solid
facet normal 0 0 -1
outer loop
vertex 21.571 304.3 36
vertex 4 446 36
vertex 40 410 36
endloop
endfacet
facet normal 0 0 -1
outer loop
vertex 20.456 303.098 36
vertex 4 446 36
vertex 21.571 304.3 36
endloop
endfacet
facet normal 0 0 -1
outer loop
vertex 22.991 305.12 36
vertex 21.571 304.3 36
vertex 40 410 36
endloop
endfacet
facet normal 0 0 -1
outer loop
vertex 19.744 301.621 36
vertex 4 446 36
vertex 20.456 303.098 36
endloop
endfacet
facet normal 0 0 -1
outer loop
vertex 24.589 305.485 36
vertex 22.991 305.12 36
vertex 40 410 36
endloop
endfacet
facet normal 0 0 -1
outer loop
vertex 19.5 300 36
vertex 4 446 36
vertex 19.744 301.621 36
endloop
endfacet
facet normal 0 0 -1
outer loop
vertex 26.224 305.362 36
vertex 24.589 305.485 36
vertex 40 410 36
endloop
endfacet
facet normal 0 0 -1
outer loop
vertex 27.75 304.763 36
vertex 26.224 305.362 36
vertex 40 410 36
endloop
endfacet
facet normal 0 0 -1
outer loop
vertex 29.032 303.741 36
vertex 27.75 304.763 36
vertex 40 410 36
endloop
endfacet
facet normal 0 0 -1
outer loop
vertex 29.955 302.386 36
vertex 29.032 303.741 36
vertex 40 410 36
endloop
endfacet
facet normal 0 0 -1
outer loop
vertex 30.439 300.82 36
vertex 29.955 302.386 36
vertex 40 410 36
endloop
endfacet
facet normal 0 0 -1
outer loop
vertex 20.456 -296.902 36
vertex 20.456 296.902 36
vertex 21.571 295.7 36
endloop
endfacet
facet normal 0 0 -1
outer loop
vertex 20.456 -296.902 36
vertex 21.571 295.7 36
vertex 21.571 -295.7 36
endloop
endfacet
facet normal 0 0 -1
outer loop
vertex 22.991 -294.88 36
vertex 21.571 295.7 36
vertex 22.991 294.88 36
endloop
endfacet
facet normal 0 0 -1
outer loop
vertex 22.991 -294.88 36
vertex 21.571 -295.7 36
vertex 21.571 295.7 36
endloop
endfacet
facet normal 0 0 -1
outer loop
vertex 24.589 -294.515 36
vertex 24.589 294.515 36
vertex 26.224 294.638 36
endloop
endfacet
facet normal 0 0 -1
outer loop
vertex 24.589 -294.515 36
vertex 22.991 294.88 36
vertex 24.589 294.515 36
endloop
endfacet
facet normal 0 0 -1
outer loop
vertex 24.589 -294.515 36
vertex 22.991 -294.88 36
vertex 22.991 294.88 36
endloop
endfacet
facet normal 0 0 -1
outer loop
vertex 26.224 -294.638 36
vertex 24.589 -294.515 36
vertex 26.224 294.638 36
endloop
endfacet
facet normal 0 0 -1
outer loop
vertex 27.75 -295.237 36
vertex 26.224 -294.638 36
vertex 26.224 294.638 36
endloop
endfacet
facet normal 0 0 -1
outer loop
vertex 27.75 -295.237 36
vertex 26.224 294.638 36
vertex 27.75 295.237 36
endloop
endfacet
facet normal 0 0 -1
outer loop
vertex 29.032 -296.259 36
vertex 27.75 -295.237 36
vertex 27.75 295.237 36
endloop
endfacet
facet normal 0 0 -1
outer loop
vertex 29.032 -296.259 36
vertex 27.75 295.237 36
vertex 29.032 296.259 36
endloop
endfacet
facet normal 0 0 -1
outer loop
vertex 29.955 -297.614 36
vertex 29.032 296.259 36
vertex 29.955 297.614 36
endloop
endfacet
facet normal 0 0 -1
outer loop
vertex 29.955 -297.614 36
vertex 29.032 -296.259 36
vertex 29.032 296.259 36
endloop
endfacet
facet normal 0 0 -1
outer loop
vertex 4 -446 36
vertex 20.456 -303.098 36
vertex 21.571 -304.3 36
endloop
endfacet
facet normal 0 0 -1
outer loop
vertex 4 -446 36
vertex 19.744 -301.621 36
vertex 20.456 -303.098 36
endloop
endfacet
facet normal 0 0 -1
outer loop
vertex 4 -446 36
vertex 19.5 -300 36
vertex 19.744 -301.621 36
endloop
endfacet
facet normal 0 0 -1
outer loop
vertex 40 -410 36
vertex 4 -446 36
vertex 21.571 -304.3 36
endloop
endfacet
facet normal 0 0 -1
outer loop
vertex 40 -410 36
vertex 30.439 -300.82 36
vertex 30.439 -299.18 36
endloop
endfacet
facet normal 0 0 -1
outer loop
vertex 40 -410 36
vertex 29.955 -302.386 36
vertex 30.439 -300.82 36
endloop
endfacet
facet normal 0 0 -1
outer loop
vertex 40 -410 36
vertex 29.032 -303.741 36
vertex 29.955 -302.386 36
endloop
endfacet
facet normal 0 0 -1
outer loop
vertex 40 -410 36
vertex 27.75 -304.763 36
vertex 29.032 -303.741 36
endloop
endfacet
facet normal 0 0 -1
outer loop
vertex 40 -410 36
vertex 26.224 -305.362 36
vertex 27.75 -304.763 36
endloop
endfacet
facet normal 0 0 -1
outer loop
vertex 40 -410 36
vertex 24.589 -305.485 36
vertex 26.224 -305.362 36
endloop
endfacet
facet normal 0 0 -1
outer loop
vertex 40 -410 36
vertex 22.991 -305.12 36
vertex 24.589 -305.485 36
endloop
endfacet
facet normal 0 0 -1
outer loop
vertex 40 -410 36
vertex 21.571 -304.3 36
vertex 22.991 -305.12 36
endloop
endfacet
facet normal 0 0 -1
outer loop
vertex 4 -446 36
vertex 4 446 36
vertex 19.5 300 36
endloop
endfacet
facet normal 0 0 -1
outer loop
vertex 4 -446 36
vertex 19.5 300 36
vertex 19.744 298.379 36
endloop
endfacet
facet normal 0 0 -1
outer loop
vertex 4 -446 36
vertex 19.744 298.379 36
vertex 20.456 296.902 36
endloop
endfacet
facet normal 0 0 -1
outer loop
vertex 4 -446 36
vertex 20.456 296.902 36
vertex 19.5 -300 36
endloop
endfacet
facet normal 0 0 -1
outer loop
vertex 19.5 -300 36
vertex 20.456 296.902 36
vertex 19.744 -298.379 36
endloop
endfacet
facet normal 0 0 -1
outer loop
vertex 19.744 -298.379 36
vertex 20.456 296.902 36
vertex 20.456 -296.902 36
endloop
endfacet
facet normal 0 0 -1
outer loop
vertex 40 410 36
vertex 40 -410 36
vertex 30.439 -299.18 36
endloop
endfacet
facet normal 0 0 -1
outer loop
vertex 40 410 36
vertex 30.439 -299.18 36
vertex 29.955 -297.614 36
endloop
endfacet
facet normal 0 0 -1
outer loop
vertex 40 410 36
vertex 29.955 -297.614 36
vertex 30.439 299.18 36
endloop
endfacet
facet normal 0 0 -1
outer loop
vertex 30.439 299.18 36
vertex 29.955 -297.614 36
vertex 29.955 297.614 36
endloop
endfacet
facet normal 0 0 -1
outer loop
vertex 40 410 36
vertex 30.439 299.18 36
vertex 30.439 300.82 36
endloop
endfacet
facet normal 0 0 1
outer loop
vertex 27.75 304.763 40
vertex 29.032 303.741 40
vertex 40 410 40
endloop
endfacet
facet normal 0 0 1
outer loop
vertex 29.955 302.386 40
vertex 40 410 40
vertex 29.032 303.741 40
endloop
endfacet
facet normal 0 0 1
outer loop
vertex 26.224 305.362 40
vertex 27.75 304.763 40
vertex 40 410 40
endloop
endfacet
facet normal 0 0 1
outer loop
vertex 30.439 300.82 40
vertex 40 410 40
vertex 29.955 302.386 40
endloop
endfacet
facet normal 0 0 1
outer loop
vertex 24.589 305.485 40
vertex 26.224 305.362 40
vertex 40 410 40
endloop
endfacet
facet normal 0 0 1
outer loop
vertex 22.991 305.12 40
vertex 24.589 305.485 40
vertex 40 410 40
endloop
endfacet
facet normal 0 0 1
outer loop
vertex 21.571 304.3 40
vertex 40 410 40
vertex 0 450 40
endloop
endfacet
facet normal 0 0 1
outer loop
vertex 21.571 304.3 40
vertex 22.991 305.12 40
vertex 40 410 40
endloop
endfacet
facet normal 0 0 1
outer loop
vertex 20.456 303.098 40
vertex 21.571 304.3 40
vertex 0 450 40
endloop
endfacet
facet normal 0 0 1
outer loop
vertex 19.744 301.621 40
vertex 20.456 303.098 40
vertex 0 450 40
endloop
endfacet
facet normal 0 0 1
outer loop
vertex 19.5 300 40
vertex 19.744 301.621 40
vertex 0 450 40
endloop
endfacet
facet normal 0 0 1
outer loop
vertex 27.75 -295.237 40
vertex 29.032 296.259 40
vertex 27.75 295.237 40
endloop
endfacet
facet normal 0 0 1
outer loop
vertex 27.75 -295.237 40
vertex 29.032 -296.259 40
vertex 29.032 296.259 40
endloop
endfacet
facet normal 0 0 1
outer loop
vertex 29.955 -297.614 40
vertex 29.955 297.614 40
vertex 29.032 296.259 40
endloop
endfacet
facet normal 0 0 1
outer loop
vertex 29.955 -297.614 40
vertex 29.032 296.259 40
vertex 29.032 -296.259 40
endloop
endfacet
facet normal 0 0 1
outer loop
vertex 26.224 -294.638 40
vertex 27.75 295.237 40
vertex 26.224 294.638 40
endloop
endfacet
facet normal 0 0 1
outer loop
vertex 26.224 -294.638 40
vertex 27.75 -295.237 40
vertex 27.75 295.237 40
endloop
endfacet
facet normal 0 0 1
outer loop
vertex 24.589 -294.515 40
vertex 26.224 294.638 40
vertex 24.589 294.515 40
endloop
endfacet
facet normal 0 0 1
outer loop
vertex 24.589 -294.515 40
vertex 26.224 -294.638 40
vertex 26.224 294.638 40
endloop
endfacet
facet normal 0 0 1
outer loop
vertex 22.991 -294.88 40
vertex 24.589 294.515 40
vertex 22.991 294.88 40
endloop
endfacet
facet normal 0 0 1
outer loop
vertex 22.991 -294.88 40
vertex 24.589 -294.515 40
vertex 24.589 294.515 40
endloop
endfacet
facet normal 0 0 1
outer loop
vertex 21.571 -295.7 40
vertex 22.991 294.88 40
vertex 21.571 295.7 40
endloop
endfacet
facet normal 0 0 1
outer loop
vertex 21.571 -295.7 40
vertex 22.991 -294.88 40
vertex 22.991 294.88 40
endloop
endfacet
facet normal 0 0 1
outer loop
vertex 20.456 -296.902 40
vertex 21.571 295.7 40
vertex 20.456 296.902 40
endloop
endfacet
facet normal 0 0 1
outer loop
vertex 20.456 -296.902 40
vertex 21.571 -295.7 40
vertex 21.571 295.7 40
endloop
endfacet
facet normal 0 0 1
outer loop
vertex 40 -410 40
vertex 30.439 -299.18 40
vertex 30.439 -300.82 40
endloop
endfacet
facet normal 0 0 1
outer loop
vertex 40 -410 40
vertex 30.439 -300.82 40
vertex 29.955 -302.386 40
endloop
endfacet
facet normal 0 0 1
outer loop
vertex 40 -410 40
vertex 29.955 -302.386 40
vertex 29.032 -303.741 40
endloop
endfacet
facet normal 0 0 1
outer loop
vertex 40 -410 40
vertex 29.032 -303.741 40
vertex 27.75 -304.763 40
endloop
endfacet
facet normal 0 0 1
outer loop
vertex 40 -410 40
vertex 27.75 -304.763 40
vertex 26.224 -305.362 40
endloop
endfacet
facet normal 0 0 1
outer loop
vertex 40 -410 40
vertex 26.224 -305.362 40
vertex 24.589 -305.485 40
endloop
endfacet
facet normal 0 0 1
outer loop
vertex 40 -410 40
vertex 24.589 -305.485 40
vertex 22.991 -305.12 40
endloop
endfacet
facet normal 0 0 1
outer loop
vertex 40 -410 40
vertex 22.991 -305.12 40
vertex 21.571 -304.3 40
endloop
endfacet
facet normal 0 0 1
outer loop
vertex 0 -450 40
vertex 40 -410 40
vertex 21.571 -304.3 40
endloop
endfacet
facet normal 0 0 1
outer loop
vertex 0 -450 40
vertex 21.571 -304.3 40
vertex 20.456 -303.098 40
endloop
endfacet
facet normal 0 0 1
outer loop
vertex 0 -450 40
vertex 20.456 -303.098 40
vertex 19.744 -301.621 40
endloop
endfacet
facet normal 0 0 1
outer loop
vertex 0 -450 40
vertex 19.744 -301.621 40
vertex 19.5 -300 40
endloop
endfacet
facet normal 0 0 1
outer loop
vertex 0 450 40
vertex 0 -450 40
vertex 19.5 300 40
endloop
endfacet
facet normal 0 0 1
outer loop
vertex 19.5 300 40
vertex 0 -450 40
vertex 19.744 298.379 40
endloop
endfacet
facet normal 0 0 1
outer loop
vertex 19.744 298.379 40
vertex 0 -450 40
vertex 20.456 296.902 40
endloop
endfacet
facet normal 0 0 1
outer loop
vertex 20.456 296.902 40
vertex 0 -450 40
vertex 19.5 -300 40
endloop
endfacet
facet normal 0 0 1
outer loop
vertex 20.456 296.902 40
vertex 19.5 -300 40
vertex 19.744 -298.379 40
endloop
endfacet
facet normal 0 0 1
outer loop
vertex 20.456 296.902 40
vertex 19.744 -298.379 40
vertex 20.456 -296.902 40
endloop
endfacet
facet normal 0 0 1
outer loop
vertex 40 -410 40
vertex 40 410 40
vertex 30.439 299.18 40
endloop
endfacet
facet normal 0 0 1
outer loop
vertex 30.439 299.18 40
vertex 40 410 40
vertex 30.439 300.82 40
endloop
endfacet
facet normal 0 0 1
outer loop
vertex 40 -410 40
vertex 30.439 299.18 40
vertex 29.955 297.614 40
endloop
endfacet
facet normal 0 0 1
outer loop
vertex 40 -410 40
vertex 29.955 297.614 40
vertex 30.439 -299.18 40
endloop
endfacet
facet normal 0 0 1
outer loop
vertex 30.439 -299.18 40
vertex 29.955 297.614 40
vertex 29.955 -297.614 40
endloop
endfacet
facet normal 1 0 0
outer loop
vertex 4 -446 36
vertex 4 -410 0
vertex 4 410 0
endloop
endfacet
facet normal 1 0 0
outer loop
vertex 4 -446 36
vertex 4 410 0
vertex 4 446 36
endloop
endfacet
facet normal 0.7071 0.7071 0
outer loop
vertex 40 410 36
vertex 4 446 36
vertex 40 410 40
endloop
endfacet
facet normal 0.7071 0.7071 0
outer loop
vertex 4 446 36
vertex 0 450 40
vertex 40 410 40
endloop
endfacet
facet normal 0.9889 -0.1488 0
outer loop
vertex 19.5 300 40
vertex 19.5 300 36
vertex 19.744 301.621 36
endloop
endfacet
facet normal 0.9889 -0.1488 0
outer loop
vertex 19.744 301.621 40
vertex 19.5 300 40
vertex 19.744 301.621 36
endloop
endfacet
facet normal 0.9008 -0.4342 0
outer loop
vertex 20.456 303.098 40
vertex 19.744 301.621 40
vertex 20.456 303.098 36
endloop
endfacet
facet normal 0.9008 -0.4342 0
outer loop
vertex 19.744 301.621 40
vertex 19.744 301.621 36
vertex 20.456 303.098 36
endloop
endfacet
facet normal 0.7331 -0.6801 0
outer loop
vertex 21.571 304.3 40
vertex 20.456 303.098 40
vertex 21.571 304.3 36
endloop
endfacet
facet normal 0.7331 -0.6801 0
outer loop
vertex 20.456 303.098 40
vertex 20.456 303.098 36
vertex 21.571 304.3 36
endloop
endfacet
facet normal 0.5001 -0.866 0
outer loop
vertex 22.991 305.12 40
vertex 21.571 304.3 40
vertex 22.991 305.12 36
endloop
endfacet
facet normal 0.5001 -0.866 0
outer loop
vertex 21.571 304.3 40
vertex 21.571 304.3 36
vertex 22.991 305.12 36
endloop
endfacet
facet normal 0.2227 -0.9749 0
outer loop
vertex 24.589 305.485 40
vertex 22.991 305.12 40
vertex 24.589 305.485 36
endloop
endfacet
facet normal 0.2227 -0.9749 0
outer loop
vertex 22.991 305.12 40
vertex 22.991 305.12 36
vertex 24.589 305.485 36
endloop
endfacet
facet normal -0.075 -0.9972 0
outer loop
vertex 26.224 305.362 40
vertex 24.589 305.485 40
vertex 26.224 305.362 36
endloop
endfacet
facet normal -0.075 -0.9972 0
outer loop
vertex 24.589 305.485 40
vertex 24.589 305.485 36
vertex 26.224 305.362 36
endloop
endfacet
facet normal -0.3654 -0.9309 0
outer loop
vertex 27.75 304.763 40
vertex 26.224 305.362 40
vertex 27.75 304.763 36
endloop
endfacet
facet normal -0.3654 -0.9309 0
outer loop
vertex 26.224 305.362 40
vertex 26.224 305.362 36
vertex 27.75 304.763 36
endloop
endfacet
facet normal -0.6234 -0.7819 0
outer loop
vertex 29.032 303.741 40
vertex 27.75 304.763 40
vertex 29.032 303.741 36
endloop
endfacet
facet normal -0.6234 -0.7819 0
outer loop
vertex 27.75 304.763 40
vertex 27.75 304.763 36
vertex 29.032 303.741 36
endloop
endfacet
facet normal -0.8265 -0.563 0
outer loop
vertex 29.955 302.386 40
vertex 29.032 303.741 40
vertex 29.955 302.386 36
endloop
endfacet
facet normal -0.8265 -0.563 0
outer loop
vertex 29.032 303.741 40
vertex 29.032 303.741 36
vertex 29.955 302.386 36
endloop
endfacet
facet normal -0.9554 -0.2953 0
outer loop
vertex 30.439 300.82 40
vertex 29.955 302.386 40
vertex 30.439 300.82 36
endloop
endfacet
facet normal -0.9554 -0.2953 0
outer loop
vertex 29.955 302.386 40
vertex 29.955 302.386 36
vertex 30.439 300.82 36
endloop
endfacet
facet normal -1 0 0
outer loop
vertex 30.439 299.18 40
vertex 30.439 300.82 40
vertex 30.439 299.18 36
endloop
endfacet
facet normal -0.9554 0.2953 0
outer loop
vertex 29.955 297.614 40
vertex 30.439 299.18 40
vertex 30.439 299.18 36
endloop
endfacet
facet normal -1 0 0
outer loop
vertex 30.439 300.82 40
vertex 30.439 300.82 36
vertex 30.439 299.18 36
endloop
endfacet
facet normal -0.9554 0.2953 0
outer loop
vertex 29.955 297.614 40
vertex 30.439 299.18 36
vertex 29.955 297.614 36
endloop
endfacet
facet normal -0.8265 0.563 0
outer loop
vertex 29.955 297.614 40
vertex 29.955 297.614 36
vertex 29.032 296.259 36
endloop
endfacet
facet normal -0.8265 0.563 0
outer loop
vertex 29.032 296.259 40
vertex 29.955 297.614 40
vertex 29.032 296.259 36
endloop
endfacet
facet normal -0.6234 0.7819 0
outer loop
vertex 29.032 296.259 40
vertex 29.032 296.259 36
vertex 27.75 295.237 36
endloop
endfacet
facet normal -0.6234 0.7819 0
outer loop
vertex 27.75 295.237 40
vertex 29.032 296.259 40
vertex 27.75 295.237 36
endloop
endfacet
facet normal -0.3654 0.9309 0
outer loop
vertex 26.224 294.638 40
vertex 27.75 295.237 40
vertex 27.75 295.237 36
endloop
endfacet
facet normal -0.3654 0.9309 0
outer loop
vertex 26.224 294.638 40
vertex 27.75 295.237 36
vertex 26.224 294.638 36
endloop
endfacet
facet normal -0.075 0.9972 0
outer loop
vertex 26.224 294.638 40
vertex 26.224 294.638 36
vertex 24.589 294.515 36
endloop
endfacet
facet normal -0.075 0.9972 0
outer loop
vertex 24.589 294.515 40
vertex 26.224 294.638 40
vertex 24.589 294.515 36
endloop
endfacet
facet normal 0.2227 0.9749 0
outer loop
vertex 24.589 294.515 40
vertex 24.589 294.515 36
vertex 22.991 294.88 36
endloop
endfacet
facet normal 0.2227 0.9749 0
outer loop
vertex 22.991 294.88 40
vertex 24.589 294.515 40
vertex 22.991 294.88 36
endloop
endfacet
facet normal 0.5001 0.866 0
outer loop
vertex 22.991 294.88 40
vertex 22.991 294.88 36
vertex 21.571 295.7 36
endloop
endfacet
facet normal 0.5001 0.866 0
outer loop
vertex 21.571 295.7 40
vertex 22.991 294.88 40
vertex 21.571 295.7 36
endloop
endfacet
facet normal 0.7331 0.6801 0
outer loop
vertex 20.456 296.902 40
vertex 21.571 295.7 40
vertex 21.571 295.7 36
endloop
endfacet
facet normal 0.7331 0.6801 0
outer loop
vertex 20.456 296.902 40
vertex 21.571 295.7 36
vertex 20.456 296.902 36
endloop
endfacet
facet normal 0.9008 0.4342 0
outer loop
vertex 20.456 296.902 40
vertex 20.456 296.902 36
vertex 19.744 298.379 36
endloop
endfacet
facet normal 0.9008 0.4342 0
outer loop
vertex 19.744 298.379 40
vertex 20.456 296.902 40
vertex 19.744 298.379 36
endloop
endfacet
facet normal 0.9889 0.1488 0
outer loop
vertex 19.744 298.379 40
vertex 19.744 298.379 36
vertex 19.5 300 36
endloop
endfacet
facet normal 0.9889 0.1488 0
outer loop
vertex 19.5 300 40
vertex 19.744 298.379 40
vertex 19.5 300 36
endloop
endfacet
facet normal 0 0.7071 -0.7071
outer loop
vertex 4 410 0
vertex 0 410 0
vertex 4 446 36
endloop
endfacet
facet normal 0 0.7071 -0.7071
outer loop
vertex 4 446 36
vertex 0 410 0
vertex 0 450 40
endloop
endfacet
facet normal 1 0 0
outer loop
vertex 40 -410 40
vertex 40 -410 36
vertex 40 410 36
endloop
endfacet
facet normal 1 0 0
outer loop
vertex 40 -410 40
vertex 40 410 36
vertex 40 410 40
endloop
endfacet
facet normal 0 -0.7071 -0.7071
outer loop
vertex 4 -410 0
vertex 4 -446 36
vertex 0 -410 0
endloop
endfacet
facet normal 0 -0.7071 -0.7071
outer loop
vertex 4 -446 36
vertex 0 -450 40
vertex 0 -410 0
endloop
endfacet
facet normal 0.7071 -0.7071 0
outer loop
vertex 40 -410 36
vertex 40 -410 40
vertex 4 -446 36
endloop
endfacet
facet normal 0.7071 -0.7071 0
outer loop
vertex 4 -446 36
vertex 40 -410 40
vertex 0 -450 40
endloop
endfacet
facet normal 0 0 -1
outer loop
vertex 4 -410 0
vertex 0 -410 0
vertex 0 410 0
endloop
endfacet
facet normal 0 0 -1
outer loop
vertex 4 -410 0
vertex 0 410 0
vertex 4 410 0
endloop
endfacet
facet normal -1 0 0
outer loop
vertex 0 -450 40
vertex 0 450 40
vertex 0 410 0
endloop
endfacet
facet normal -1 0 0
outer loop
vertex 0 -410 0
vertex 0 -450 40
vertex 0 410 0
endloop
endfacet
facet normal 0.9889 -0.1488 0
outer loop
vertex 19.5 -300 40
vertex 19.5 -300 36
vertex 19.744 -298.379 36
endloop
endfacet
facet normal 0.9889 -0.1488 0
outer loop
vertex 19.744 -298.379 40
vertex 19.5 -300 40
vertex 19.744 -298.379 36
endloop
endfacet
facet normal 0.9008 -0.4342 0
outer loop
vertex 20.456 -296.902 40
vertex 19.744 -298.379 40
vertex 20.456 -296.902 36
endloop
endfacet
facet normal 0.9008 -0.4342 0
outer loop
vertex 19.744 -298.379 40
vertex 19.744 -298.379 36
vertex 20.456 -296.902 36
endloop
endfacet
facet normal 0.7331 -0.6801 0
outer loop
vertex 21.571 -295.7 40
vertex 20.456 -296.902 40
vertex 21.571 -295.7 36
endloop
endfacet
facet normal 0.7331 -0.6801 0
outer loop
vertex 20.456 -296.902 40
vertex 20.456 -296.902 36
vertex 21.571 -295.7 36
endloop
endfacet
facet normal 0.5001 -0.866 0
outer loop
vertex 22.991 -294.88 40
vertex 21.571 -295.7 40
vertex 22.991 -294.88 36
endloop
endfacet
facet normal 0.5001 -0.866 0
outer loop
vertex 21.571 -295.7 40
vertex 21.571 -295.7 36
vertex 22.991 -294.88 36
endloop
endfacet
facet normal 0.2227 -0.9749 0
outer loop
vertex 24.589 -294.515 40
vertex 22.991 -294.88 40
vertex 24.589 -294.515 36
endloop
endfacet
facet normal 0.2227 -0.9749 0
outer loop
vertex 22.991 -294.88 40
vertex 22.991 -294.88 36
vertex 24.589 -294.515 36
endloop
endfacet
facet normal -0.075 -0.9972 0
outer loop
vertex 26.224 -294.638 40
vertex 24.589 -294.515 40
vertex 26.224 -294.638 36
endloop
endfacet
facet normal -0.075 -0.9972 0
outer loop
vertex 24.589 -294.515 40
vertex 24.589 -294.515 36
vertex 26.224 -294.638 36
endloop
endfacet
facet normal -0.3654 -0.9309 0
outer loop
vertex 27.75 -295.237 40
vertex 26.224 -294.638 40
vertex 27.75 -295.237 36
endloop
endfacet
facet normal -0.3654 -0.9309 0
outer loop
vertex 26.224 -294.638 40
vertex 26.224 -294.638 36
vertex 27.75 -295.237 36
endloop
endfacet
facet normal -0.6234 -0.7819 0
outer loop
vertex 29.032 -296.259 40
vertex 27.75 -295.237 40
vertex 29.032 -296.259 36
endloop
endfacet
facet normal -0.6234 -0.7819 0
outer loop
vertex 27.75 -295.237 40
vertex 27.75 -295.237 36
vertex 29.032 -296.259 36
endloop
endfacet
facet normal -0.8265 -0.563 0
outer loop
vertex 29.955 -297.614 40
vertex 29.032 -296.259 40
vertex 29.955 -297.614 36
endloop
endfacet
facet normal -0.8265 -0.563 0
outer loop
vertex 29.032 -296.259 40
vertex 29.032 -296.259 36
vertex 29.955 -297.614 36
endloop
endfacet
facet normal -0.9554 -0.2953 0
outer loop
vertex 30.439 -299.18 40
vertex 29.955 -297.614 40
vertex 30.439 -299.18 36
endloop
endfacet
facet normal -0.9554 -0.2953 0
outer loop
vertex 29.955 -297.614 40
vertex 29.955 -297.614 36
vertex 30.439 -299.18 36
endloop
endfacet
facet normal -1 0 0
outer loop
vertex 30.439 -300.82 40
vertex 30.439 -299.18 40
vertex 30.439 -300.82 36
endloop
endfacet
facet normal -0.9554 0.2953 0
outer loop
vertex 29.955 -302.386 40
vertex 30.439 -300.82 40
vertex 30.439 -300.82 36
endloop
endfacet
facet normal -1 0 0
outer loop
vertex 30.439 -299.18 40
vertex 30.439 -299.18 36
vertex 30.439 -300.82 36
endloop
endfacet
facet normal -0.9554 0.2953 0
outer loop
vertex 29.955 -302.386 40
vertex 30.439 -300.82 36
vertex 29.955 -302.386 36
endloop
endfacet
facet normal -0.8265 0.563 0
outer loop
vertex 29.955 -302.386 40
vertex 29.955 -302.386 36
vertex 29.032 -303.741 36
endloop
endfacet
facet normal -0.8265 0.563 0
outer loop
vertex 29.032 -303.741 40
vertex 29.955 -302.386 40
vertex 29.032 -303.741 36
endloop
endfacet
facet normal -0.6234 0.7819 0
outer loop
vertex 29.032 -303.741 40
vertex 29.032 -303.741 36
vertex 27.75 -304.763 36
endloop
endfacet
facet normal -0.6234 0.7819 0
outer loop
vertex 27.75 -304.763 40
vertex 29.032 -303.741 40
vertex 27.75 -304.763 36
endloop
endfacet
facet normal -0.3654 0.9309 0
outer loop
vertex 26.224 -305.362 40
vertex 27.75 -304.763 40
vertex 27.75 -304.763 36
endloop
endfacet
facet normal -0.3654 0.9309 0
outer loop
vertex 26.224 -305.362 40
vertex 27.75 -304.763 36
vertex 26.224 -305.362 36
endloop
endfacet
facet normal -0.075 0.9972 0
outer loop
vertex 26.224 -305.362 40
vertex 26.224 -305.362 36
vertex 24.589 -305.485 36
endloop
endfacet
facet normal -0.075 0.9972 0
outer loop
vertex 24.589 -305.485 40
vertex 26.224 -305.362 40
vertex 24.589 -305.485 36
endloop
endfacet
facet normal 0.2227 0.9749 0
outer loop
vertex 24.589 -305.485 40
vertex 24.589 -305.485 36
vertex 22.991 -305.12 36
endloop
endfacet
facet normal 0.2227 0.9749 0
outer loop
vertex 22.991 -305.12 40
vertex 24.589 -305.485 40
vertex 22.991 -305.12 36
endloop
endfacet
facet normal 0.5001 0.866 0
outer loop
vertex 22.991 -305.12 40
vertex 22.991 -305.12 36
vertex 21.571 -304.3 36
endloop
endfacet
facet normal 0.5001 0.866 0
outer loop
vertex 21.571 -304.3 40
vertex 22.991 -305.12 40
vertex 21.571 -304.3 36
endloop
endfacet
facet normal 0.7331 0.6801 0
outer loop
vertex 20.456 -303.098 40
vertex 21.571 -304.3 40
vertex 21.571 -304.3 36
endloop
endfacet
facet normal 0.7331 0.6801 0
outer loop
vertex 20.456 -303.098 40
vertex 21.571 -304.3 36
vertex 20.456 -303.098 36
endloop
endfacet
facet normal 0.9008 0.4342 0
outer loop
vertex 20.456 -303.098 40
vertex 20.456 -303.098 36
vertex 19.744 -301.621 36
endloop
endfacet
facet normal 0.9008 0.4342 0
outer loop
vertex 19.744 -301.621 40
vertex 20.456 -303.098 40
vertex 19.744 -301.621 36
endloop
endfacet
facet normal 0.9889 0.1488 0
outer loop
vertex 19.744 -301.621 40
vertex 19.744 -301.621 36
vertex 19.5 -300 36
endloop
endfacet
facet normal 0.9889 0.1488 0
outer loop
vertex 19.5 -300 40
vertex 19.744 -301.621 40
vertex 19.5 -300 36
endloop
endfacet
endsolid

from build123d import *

# Parameters (mm, degrees)
F1_DEPTH = 450
F3_DEPTH = 40
F5_DEPTH = 40
F7_D     = 11


with BuildPart() as f1:
    # F0 (on Front) → F1 (new body, symmetric)
    with BuildSketch(Plane.XZ):
        Polygon((0, 40), (0, 0), (4, 0), (4, 36), (40, 36), (40, 40), align=None)
    extrude(amount=F1_DEPTH, both=True)

    # F2 (on face) → F3 (cut)
    with BuildSketch(Plane(origin=(0, 0, 0), x_dir=(0, -1, 0), z_dir=(-1, 0, 0))):
        Polygon((-410, 0), (-450, 40), (-450, 0), align=None)
        Polygon((450, 0), (450, 40), (410, 0), align=None)
    extrude(amount=-F3_DEPTH, mode=Mode.SUBTRACT)

    # F4 (on face) → F5 (cut)
    with BuildSketch(Plane.XY.offset(40)):
        Polygon((40, 450), (0, 450), (40, 410), align=None)
        Polygon((40, -410), (0, -450), (40, -450), align=None)
    extrude(amount=-F5_DEPTH, mode=Mode.SUBTRACT)

    # F7 (through all)
    with Locations(Plane.XY.offset(40)):
        with Locations((25, -300), (25, 300)):
            Hole(F7_D / 2)


solid = f1.part
